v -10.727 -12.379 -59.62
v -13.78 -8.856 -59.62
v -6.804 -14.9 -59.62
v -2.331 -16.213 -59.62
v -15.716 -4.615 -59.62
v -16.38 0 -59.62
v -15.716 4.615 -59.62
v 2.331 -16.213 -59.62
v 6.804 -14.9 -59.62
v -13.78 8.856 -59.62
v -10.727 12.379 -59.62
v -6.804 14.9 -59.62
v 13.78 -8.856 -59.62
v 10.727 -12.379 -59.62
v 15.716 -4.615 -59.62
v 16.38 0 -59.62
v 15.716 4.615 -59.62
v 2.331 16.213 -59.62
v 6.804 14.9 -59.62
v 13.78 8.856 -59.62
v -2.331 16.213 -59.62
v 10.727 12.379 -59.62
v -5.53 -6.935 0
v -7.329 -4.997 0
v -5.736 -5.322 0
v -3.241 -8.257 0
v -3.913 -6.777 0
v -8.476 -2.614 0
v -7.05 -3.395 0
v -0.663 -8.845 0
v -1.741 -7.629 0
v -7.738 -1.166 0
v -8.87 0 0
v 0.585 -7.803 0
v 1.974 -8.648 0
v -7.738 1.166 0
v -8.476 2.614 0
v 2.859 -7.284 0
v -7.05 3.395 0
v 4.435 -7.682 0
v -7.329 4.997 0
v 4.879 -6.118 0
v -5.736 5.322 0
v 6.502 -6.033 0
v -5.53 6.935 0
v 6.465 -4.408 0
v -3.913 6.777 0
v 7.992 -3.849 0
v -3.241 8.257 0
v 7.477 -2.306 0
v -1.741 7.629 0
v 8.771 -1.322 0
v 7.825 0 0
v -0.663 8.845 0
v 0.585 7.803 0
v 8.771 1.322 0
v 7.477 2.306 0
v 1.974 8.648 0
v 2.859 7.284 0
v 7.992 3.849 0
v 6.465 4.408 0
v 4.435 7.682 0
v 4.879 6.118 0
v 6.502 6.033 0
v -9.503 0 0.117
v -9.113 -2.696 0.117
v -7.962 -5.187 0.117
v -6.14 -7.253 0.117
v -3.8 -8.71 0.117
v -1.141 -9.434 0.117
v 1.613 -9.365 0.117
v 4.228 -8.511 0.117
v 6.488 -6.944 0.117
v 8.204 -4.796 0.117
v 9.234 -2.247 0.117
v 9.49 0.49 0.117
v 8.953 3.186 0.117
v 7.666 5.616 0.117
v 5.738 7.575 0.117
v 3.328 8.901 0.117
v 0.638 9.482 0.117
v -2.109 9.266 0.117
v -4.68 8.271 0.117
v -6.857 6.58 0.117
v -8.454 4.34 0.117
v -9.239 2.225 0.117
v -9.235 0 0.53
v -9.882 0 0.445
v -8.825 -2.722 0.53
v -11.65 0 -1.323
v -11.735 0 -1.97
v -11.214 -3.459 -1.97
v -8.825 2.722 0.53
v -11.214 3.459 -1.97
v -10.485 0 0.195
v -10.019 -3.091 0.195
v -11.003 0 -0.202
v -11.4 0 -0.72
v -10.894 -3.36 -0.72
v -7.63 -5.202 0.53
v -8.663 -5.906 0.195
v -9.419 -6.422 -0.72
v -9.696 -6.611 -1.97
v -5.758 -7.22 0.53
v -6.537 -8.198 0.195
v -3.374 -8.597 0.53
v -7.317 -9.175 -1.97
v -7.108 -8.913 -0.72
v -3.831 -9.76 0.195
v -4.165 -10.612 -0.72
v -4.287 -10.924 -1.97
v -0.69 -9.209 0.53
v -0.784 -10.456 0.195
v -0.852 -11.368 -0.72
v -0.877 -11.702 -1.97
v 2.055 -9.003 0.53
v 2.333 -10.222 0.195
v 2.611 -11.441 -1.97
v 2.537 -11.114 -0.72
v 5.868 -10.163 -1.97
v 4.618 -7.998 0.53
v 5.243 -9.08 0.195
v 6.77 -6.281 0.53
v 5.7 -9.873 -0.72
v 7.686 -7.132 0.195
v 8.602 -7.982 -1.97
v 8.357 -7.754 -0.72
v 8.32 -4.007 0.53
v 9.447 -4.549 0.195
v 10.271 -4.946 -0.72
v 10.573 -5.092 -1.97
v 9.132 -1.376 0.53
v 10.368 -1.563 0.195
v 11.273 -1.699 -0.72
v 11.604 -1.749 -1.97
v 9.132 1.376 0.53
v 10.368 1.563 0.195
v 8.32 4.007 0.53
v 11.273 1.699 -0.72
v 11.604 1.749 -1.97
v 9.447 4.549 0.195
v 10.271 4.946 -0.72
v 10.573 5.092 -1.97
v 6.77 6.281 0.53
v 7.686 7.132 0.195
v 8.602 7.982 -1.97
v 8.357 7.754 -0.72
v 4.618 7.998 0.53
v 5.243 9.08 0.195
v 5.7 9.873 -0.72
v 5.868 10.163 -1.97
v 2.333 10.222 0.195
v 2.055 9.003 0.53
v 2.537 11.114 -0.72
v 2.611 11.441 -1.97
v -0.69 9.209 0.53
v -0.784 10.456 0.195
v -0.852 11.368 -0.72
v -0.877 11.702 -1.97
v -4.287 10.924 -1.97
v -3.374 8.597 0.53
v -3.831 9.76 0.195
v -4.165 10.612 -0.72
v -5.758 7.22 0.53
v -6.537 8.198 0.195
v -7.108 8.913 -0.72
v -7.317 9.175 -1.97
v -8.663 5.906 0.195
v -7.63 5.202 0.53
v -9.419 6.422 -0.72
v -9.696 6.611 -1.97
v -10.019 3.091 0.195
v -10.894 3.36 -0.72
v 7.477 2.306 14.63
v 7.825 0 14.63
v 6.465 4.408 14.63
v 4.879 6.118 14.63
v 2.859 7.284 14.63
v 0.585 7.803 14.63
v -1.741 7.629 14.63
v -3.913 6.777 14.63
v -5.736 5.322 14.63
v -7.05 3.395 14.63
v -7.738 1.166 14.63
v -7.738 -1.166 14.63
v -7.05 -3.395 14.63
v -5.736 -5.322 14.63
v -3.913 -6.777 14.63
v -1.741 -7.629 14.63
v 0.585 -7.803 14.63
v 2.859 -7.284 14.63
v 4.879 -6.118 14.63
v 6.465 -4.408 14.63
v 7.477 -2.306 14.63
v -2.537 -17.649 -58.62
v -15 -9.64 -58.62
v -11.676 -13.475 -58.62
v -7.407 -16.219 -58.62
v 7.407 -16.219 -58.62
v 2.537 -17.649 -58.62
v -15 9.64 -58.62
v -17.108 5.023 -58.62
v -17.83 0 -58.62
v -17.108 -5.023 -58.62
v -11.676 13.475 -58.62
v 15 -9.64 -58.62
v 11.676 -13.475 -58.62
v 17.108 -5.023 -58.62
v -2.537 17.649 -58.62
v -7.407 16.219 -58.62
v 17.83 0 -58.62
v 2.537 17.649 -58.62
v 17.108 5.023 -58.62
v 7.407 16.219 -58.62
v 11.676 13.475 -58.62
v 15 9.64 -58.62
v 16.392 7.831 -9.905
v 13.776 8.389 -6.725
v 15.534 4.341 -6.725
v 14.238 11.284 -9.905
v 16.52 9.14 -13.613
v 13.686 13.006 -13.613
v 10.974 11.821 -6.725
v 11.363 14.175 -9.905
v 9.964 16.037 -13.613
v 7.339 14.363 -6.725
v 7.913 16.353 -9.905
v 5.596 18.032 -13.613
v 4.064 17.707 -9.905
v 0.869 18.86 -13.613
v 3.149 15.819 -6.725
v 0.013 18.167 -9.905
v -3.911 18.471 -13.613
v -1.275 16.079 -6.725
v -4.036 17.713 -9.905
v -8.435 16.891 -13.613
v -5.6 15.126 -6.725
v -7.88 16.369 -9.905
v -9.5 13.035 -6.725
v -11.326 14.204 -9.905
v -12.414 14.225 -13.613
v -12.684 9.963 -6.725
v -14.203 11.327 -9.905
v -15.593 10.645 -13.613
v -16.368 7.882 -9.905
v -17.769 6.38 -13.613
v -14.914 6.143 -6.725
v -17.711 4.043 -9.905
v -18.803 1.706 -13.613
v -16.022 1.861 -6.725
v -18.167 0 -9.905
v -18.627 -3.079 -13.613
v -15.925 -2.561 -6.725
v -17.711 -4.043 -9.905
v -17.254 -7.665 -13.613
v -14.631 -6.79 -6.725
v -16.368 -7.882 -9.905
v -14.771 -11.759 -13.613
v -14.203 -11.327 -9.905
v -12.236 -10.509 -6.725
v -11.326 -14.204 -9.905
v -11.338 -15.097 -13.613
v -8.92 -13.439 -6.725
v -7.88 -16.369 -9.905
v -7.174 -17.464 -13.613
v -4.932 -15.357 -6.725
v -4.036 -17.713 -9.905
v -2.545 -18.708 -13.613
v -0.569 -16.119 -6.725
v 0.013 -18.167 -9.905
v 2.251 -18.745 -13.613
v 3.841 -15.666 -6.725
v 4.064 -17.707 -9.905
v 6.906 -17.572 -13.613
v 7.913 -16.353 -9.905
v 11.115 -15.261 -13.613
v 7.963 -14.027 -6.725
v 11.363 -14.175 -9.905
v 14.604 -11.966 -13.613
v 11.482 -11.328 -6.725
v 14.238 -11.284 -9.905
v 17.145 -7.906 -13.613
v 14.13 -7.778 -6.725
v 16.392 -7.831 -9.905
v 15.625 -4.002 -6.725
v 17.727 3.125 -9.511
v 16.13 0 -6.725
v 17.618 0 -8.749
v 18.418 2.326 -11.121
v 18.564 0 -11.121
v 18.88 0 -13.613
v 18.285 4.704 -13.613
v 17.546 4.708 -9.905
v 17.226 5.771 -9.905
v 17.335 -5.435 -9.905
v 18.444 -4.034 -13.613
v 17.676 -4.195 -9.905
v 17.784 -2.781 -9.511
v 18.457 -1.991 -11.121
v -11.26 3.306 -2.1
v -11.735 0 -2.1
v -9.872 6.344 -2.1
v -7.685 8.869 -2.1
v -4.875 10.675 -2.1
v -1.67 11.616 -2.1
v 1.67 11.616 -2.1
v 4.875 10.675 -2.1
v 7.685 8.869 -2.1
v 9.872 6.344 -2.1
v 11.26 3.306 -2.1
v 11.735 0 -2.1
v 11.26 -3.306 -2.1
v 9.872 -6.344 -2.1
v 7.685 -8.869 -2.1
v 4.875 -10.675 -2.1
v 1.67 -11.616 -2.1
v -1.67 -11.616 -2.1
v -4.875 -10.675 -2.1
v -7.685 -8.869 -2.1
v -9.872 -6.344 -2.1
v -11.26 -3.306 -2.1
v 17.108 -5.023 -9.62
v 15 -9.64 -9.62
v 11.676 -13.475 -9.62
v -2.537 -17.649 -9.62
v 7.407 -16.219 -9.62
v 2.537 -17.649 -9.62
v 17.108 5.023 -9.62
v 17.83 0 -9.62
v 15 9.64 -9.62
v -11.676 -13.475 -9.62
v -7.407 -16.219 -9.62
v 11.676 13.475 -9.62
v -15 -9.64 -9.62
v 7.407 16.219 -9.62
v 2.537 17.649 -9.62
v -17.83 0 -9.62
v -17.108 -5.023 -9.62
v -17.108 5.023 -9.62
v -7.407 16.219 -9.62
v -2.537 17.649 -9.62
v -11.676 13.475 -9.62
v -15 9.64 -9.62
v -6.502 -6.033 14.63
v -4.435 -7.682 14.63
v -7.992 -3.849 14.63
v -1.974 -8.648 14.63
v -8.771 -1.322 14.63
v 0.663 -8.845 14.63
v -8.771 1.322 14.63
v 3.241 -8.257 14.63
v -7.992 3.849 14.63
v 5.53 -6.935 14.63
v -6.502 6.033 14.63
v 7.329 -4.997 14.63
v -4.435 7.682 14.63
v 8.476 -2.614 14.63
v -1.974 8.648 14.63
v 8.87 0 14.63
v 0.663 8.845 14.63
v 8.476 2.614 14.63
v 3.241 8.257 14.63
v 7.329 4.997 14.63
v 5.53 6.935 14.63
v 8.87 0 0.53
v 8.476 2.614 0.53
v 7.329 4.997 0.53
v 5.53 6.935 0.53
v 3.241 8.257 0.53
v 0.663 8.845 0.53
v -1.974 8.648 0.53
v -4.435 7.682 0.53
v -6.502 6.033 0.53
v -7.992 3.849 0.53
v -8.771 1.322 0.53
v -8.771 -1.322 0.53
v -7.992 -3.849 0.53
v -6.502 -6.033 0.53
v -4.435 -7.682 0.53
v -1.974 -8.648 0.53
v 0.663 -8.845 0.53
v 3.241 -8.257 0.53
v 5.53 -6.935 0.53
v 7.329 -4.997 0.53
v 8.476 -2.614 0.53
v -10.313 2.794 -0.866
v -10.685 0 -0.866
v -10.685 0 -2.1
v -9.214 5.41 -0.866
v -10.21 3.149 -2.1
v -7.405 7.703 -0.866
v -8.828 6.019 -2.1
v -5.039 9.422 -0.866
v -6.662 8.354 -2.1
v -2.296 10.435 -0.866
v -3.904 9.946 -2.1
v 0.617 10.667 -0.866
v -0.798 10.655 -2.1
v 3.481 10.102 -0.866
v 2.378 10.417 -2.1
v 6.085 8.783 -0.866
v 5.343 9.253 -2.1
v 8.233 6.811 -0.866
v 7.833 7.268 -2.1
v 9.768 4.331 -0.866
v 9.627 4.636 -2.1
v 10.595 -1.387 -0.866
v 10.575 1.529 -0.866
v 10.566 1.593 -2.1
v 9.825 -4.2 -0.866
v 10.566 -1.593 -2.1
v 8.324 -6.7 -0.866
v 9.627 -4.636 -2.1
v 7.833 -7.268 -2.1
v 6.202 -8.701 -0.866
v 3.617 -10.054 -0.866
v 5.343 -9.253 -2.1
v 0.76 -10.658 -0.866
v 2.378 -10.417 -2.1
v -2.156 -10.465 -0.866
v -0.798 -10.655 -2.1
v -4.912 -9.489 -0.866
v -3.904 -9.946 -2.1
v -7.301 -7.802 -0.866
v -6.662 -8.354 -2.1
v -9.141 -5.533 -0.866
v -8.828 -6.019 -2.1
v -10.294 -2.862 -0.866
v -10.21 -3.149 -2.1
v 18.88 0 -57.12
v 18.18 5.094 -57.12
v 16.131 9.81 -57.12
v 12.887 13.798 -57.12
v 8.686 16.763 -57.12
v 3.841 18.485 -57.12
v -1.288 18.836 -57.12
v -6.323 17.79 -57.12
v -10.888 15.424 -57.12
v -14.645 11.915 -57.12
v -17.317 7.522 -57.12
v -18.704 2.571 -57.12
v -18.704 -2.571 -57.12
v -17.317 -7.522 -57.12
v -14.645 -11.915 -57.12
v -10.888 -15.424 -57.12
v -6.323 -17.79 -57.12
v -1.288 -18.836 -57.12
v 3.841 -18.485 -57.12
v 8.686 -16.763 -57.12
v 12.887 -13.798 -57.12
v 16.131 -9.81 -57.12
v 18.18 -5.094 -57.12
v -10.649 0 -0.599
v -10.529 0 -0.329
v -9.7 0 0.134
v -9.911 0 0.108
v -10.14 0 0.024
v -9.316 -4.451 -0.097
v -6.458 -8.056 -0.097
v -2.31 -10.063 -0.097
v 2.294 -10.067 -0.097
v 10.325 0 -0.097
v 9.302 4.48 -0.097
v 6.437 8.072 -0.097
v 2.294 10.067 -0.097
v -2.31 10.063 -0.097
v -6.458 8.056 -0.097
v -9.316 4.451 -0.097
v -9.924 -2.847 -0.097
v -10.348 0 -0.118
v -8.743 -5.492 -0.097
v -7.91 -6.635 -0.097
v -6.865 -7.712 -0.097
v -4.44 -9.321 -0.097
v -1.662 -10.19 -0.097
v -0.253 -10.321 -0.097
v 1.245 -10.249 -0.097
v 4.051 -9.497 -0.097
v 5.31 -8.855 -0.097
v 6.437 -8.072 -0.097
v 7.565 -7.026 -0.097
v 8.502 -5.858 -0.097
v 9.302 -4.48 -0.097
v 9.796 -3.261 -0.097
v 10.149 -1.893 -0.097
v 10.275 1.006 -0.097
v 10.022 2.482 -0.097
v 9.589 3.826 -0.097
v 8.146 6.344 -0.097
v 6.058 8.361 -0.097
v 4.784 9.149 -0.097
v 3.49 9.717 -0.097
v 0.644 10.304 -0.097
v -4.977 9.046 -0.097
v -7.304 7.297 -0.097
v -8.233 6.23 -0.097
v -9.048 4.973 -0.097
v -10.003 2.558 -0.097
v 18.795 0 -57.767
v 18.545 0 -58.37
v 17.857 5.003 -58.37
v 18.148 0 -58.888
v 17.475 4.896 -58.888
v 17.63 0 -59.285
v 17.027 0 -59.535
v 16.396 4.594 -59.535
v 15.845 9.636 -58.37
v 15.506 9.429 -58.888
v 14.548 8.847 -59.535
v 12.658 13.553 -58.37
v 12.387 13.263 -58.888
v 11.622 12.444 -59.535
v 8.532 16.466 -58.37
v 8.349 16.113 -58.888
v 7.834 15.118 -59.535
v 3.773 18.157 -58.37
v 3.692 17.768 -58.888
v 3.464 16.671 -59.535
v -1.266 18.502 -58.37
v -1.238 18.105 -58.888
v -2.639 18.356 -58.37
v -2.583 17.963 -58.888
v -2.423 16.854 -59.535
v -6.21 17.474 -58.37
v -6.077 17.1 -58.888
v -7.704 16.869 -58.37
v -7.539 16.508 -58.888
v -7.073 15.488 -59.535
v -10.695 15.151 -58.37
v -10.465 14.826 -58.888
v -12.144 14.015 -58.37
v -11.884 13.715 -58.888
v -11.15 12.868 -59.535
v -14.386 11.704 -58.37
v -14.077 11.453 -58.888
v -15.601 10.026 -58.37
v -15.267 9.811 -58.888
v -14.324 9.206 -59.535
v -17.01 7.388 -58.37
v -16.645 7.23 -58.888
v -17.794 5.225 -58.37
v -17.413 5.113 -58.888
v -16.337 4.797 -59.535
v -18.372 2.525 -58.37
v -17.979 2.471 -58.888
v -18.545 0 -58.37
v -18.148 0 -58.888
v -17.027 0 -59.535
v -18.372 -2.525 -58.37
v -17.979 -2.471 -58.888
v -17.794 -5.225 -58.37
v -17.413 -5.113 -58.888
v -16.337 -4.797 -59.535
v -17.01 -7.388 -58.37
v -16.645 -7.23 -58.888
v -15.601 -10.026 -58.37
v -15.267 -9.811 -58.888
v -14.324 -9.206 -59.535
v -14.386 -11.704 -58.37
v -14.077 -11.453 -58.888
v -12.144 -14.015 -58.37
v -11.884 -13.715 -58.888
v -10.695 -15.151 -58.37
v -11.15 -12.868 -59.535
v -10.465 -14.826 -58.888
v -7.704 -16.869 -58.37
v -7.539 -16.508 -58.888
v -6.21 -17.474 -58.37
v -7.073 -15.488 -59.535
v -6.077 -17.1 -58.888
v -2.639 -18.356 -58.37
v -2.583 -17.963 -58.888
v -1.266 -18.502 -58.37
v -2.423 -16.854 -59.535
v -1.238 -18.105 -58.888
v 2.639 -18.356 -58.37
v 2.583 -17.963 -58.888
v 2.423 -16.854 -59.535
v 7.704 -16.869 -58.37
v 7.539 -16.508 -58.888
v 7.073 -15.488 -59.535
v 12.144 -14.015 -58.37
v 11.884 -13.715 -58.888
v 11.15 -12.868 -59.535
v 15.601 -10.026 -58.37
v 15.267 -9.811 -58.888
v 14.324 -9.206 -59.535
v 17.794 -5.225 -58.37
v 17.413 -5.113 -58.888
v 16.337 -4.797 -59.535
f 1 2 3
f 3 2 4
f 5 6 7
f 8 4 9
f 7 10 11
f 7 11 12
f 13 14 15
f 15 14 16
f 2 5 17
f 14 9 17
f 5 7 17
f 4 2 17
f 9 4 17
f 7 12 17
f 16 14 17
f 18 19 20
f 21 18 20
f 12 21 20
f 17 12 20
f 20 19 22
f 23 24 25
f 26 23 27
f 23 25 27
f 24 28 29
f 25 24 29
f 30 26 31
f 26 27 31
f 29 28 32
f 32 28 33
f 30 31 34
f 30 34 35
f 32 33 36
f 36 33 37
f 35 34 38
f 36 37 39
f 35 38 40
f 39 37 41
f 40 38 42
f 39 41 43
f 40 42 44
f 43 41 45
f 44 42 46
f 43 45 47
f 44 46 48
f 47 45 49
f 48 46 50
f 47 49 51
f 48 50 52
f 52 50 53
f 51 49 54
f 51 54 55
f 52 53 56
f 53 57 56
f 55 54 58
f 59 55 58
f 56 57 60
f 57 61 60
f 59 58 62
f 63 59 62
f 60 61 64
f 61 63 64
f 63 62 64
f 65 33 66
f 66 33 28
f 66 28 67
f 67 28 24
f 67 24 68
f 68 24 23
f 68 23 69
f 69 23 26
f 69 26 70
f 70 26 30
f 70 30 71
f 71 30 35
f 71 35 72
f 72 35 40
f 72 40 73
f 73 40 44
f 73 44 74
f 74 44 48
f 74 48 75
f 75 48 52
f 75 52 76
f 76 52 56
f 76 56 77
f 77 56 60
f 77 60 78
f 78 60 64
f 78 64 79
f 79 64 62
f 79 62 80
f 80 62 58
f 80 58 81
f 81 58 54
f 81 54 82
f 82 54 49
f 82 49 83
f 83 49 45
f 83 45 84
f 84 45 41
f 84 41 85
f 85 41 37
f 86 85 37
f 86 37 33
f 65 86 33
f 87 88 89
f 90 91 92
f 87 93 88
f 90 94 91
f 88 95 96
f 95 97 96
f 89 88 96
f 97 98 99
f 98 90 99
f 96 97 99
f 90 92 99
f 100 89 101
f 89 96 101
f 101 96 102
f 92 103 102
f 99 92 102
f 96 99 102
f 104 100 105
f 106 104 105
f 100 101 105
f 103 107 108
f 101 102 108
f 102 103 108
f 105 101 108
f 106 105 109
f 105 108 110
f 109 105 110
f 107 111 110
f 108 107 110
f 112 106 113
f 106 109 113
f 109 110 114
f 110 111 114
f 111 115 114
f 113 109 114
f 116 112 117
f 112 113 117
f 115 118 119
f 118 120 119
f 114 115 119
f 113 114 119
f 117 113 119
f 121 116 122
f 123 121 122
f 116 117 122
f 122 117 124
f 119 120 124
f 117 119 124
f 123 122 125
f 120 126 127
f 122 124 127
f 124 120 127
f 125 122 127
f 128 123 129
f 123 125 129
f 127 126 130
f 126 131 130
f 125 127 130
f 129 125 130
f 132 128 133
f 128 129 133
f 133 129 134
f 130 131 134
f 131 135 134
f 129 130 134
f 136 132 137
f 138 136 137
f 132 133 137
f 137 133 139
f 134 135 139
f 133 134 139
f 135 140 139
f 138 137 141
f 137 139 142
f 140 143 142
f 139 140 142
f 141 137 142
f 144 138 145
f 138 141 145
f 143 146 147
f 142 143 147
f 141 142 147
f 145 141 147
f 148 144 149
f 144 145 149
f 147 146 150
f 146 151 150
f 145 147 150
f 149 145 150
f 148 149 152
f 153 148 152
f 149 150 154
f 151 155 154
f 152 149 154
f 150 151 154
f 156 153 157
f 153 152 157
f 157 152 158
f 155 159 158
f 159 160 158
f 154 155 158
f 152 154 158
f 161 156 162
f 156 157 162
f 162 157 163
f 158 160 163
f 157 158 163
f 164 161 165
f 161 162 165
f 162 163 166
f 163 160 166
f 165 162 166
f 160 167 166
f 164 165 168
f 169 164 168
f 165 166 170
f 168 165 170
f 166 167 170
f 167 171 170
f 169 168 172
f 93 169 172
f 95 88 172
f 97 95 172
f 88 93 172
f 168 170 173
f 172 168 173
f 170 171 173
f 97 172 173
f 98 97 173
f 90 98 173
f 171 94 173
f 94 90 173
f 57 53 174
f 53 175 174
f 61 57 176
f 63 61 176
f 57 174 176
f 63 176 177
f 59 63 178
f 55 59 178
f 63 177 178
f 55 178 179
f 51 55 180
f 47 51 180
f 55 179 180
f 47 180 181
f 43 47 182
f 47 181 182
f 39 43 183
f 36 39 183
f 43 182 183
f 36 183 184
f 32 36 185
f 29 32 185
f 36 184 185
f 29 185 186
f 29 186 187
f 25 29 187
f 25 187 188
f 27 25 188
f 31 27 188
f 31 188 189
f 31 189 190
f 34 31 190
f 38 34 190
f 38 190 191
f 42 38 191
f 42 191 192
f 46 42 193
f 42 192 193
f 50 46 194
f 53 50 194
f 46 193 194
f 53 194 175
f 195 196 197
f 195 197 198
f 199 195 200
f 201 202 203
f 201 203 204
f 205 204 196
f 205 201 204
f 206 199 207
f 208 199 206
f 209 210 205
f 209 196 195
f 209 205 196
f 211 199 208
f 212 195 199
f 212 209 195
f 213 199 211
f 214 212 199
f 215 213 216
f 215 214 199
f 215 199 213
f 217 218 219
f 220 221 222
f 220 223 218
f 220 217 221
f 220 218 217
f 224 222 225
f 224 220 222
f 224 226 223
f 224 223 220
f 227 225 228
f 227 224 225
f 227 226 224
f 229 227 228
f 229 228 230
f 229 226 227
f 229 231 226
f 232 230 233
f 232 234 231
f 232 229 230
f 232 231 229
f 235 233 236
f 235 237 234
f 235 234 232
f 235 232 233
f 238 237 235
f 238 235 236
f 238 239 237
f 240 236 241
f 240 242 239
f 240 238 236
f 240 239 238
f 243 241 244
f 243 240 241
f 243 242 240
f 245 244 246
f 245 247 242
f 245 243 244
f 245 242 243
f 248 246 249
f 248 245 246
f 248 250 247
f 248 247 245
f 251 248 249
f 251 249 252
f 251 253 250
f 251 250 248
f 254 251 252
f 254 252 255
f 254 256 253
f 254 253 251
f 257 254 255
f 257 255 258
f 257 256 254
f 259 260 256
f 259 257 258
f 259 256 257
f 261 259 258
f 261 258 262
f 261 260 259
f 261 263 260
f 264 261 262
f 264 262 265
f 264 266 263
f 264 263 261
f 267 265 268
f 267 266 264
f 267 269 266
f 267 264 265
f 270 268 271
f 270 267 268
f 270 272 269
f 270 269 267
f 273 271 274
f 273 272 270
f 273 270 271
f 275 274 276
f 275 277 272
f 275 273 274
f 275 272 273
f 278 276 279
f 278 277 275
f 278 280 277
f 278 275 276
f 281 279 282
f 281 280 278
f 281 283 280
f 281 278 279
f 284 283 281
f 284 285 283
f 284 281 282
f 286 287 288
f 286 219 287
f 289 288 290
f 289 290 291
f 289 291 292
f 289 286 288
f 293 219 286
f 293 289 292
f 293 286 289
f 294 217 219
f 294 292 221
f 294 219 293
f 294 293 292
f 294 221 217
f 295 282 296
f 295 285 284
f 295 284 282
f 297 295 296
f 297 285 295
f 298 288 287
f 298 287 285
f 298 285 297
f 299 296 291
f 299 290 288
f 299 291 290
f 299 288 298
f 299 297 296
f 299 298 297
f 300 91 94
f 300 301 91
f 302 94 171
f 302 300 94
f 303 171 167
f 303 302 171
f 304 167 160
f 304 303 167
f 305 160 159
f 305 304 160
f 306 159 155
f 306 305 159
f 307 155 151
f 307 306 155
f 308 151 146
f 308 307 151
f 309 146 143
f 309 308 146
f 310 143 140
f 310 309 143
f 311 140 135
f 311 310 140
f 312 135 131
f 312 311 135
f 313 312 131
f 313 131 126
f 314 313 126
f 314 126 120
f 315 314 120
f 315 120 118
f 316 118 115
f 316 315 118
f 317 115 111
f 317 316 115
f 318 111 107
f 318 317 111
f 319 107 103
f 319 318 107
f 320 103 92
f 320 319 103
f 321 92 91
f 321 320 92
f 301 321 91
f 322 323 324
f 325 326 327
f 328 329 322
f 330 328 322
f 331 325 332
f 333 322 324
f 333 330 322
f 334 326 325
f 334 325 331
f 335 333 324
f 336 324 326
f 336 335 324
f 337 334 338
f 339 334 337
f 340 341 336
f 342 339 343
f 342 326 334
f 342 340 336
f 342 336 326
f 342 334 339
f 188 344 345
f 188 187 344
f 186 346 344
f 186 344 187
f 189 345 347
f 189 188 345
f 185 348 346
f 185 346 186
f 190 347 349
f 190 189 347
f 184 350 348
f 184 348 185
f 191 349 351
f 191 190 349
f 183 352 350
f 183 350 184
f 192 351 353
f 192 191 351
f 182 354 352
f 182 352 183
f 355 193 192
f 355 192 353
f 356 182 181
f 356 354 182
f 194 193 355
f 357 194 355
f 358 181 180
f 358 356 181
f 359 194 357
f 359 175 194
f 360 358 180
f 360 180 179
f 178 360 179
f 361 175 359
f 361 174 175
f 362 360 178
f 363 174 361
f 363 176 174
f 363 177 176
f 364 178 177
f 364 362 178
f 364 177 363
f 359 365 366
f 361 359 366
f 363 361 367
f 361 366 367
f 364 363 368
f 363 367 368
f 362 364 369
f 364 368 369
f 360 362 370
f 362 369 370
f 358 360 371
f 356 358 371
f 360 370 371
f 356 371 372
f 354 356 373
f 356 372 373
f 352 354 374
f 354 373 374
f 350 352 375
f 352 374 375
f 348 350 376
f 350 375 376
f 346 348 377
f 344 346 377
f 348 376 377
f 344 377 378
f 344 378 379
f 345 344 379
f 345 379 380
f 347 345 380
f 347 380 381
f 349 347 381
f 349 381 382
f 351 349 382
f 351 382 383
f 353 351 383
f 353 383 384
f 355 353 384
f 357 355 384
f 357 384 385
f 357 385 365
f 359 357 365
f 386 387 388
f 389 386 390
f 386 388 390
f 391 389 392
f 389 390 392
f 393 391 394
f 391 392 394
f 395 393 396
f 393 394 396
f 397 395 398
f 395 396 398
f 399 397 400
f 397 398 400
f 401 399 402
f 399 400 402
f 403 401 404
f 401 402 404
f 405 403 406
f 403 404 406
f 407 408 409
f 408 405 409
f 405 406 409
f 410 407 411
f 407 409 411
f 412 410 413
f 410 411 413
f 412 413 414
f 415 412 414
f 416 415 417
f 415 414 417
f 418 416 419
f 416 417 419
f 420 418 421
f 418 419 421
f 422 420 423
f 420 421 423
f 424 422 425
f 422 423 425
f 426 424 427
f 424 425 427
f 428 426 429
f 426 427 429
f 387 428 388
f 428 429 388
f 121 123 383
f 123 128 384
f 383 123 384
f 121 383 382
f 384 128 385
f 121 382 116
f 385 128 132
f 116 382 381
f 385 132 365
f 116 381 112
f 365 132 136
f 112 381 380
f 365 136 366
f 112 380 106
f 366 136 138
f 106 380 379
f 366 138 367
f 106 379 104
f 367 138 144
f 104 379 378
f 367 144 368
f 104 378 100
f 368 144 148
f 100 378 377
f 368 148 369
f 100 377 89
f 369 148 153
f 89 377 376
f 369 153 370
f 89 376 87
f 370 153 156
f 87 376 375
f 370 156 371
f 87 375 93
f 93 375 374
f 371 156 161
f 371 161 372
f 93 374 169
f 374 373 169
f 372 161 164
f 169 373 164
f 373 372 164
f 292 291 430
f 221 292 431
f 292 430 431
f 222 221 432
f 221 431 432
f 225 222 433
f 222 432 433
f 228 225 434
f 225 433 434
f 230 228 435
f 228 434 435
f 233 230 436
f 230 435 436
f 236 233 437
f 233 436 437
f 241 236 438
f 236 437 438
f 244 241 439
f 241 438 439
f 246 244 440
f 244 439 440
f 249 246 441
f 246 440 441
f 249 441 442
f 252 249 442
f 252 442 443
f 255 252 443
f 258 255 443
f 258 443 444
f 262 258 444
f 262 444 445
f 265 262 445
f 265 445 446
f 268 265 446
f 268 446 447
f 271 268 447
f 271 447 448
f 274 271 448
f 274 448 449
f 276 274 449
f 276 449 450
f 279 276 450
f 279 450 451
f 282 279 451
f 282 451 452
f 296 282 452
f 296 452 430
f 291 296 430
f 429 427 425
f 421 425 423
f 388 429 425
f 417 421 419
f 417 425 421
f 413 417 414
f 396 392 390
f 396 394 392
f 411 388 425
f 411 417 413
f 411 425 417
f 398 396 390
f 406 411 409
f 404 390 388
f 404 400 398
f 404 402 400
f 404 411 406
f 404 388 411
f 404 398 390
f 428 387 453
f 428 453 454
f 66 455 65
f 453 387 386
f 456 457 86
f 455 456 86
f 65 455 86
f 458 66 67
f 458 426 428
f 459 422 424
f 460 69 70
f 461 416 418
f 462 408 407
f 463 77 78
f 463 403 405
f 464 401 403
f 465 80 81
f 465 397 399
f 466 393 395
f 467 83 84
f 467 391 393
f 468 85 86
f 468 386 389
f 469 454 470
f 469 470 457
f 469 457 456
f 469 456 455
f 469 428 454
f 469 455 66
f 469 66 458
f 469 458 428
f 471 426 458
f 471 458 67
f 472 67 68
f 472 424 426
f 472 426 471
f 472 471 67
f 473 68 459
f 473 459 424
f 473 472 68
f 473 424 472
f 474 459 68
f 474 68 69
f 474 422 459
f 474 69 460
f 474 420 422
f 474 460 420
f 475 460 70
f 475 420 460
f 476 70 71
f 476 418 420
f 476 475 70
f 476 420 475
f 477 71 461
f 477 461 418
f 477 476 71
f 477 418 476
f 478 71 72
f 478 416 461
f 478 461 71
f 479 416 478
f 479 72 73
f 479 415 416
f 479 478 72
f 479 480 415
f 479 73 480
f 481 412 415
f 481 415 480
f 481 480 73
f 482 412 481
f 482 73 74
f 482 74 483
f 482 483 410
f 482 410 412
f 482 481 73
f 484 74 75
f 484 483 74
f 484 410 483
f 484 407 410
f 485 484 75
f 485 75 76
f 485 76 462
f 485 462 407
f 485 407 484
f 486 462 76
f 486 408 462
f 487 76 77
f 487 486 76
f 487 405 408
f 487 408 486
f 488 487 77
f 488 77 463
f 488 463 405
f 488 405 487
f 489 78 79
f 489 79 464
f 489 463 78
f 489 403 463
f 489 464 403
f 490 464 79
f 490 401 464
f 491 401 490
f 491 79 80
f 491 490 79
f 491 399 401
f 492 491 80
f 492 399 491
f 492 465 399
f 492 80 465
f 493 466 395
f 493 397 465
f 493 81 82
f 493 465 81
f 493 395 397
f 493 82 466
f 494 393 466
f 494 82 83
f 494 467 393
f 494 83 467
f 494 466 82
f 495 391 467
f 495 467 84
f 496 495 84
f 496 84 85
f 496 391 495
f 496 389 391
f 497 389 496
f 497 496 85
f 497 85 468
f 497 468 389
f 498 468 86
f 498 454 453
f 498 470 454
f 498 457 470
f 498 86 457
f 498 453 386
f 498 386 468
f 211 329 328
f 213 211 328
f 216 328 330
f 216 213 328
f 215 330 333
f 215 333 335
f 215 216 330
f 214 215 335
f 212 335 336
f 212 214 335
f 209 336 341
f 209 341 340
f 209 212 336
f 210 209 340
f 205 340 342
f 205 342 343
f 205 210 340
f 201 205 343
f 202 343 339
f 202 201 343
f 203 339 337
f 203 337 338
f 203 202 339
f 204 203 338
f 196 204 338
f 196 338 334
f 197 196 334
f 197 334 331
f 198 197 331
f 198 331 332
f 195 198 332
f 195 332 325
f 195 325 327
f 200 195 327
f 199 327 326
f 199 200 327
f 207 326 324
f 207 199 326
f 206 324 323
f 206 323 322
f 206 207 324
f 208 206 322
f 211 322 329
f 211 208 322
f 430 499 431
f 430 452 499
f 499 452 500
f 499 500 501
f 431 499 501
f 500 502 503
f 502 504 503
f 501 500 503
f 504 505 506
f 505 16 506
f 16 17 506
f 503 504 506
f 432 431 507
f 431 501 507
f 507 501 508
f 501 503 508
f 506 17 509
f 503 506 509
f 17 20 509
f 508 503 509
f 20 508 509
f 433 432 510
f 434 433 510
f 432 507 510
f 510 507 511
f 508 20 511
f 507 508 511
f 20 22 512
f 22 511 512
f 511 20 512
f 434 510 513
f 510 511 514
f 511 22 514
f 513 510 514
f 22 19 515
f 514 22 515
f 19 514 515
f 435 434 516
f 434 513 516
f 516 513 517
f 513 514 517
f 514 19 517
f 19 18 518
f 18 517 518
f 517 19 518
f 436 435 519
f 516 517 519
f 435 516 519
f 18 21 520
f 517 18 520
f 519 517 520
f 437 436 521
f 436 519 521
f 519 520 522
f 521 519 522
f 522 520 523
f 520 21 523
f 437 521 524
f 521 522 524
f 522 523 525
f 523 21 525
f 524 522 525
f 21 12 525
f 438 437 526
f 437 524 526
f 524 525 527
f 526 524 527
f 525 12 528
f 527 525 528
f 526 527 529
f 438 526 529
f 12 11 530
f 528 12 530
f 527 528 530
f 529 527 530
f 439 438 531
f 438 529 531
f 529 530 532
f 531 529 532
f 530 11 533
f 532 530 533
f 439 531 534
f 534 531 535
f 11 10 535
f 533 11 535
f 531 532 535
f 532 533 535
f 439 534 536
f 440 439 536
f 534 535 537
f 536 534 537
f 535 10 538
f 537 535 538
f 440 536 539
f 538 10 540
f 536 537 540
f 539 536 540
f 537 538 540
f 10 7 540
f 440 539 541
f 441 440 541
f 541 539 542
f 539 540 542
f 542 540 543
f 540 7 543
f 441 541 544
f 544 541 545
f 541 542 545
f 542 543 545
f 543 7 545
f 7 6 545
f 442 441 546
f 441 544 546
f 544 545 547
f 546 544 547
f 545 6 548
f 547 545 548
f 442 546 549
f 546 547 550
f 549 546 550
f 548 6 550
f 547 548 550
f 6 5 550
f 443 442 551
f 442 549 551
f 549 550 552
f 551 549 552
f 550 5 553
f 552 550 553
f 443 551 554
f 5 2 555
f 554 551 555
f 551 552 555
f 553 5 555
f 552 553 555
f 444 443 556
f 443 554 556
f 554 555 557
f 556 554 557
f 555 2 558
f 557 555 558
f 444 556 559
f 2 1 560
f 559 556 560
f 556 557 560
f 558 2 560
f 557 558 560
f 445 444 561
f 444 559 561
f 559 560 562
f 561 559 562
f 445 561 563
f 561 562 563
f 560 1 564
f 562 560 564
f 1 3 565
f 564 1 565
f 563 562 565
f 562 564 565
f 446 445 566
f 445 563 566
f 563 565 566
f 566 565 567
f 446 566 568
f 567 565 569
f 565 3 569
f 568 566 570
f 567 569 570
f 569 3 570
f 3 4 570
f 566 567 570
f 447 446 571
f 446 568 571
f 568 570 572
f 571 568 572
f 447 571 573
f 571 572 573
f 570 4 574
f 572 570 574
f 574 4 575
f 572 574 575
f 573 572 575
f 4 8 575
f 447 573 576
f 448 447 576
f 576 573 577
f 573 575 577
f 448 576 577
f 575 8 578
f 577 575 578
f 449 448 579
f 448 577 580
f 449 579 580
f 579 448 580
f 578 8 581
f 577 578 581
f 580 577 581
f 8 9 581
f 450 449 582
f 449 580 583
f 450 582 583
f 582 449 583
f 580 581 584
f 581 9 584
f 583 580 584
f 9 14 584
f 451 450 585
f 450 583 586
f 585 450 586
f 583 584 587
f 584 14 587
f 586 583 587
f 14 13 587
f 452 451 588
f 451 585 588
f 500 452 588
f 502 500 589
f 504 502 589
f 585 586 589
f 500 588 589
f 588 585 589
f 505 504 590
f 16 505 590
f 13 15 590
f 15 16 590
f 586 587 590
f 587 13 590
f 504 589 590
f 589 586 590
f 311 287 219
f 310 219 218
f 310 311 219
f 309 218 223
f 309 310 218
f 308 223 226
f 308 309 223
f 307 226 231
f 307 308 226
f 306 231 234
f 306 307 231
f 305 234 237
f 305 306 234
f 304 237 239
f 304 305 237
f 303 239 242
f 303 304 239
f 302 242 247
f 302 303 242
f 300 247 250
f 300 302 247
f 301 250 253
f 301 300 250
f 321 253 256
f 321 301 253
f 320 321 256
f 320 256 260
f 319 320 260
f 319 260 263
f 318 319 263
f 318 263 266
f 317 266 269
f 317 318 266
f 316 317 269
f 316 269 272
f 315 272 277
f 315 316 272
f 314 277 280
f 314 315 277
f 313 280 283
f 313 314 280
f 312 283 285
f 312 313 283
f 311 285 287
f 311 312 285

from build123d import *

# Parameters (mm, degrees)
SKETCH2_R           = 8.87
SKETCH2_R_2         = 7.825
BOSS_EXTRUDE1_DEPTH = 14.63
SKETCH3_R           = 11.735
SKETCH3_R_2         = 10.685
BOSS_EXTRUDE2_DEPTH = 2.63
FILLET1_R           = 2.5
FILLET2_R           = 1
SKETCH6_R           = 7.825
CUT_EXTRUDE2_DEPTH  = 18.63
SKETCH7_R           = 18.88
BOSS_EXTRUDE3_DEPTH = 1
SKETCH10_R          = 18.88
SKETCH10_R_2        = 17.83
BOSS_EXTRUDE4_DEPTH = 49
FILLET3_R           = 2.5
FILLET6_R           = 10


# Read off the part's stored shape, not the designer's step: Loft5, Loft6
with BuildPart() as part:
    # Sketch2 → Boss-Extrude1 (new body)
    with BuildSketch(Plane.XY):
        Circle(SKETCH2_R)
        Circle(SKETCH2_R_2, mode=Mode.SUBTRACT)
    extrude(amount=BOSS_EXTRUDE1_DEPTH)


with BuildPart() as body_2:
    # Sketch3 → Boss-Extrude2 (new body)
    with BuildSketch(Plane(origin=(0, 0, -2.1), x_dir=(-1, 0, 0), z_dir=(0, 0, -1))):
        Circle(SKETCH3_R)
        Circle(SKETCH3_R_2, mode=Mode.SUBTRACT)
    extrude(amount=-BOSS_EXTRUDE2_DEPTH)


    add(part.part)  # loft1 joins it to this body
    # loft up to a face of the part (loft1)
    loft([Face(Wire([body_2.edges().sort_by_distance((8.033160288, -8.554446843, 0.53))[0]])), Face(Wire([body_2.edges().sort_by_distance((-6.07193283, -6.465951725, 0))[0]]))])

    # Fillet1
    fillet1_edges = [body_2.edges().sort_by_distance(p)[0] for p in [
        (11.735, 0, 0.53),
    ]]
    fillet(fillet1_edges, radius=FILLET1_R)

    # Fillet2
    fillet2_edges = [body_2.edges().sort_by_distance(p)[0] for p in [
        (10.685, 0, 0.335759162),
    ]]
    fillet(fillet2_edges, radius=FILLET2_R)

    # Sketch6 → Cut-Extrude2 (cut)
    with BuildSketch(Plane.XY.offset(14.63)):
        Circle(SKETCH6_R)
    extrude(amount=-CUT_EXTRUDE2_DEPTH, mode=Mode.SUBTRACT)



with BuildPart() as body_2_2:
    # Sketch7 → Boss-Extrude3 (new body)
    with BuildSketch(Plane.XY.offset(-59.62)):
        Circle(SKETCH7_R)
    extrude(amount=BOSS_EXTRUDE3_DEPTH)

    # Sketch10 → Boss-Extrude4 (add)
    with BuildSketch(Plane.XY.offset(-58.62)):
        Circle(SKETCH10_R)
        Circle(SKETCH10_R_2, mode=Mode.SUBTRACT)
    extrude(amount=BOSS_EXTRUDE4_DEPTH)

    # Fillet3
    fillet3_edges = [body_2_2.edges().sort_by_distance(p)[0] for p in [
        (-18.88, 0, -59.62),
    ]]
    fillet(fillet3_edges, radius=FILLET3_R)


with BuildPart() as body_3:
    # Loft5 outline → Loft5 (revolve)
    with BuildSketch(Plane.XZ):
        Polygon((10.685, -2.1), (0, -2.1), (0, -9.62), (17.83, -9.62), align=None)
    revolve(axis=Axis((0, 0, 0), (0, 0, 1)))


with BuildPart() as body_2_1:
    add(body_2.part)

    add(body_2_2.part)  # Loft6 merges body 2 2

    add(body_3.part)  # Loft6 merges body 3
    # Loft6 outline → Loft6 (revolve)
    with BuildSketch(Plane.XZ):
        Polygon((18.88, -9.62), (11.735, -2.1), (10.685, -2.1), (17.83, -9.62), align=None)
    revolve(axis=Axis((0, 0, 0), (0, 0, 1)))

    # Fillet6
    fillet6_edges = [body_2_1.edges().sort_by_distance(p)[0] for p in [
        (-18.88, 0, -9.62),
    ]]
    fillet(fillet6_edges, radius=FILLET6_R)


solid = body_2_1.part
